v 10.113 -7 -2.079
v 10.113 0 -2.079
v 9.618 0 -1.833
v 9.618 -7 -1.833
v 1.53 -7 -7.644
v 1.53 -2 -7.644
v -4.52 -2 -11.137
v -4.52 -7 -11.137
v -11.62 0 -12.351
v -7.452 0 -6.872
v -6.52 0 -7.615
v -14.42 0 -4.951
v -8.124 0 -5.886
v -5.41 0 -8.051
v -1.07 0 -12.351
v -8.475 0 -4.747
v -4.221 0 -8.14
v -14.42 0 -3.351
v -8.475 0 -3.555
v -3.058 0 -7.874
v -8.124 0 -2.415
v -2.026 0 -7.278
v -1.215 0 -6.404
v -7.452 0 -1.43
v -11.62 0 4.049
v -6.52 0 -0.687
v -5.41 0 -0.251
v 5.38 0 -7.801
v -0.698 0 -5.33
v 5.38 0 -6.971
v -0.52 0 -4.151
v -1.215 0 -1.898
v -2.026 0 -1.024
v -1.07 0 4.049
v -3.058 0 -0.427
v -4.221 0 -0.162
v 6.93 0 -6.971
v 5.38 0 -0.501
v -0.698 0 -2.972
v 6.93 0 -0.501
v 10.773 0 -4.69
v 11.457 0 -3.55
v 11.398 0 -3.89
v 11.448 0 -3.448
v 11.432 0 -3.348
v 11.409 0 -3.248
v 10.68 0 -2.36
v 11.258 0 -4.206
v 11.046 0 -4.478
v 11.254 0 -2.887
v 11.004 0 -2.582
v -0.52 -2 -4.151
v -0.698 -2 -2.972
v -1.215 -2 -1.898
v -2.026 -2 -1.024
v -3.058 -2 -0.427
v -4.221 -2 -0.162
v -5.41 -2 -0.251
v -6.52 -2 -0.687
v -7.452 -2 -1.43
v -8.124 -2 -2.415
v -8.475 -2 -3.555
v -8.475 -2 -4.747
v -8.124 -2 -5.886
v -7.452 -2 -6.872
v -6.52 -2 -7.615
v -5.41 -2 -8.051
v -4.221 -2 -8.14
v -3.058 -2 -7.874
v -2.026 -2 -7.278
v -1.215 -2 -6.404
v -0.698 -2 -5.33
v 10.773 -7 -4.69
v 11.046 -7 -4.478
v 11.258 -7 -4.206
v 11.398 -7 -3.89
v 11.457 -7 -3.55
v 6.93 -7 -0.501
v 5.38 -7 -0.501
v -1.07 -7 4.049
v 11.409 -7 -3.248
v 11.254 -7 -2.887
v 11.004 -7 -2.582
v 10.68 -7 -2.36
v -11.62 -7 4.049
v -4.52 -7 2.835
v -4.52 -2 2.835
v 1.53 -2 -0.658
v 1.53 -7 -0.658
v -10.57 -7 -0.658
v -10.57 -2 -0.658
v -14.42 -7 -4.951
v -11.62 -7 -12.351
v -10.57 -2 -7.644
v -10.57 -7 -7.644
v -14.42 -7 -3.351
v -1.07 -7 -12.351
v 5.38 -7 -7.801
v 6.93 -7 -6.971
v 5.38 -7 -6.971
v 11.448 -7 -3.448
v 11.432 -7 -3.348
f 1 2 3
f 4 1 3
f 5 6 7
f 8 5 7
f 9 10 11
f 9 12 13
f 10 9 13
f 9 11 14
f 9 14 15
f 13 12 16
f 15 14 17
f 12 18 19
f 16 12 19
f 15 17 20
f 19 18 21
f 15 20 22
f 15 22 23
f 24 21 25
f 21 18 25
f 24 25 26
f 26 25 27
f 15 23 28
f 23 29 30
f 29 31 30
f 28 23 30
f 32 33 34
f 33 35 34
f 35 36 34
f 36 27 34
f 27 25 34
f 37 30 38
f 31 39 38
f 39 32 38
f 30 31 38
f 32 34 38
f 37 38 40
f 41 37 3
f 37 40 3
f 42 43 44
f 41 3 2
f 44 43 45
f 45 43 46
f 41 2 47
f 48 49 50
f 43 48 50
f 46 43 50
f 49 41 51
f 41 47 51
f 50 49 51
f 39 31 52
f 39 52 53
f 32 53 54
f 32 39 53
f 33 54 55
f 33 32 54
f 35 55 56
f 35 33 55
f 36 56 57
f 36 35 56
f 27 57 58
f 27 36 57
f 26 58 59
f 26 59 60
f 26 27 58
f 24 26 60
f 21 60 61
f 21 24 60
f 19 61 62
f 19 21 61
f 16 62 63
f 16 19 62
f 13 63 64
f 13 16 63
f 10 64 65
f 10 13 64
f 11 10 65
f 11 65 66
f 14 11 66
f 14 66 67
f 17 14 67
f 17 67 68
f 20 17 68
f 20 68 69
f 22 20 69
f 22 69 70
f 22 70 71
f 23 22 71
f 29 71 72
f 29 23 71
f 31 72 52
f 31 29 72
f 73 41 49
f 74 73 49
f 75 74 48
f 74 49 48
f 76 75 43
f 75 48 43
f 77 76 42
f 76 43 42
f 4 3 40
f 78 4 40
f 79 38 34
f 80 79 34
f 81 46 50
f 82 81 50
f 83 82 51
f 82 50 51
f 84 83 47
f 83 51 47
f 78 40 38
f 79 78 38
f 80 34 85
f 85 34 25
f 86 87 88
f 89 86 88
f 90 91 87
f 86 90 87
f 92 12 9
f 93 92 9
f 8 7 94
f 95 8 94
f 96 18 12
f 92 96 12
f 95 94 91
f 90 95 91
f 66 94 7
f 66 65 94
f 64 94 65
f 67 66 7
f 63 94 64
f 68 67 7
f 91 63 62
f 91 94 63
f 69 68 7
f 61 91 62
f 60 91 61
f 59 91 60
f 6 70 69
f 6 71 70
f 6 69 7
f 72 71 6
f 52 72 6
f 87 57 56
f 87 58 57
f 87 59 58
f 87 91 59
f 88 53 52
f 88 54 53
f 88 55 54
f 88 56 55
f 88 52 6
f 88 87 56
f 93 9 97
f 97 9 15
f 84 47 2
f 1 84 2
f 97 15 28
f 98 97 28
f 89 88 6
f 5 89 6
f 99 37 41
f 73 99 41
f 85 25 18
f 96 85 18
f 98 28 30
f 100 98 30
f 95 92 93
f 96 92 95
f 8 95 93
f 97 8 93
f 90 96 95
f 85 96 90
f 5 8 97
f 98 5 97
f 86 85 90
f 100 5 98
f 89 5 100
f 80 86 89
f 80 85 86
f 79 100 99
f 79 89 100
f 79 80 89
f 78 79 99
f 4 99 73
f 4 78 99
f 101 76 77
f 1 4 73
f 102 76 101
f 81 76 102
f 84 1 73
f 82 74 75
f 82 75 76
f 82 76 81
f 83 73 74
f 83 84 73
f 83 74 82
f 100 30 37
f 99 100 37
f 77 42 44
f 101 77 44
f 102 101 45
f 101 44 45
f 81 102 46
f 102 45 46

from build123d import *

# Parameters (mm, degrees)
F1_DEPTH = 7
F0_R     = 4
F2_DEPTH = 2


with BuildPart() as f1:
    # F0 (on Front) → F1 (new body)
    with BuildSketch(Plane.XZ):
        Polygon((-1.0698140982, 4.0490861801), (-11.6198140982, 4.0490861801), (-14.4198140982, -3.3509138199), (-14.4198140982, -4.9509138199), (-11.6198140982, -12.3509138199), (-1.0698140982, -12.3509138199), (5.3801859018, -7.8009138199), (5.3801859018, -6.9708852422), (5.3801859018, -0.5009138199), align=None)
        Polygon((1.5301859018, -0.6579446913), (1.5301859018, -7.6438829485), (-4.5198140982, -11.1368520771), (-10.5698140982, -7.6438829485), (-10.5698140982, -0.6579446913), (-4.5198140982, 2.8350244373), align=None, mode=Mode.SUBTRACT)
        with BuildLine():
            Line((6.9301859018, -0.5009138199), (5.3801859018, -0.5009138199))
            Line((5.3801859018, -0.5009138199), (5.3801859018, -6.9708852422))
            Line((5.3801859018, -6.9708852422), (6.9301859018, -6.9708852422))
            Line((6.9301859018, -6.9708852422), (10.7727036603, -4.6895619497))
            ThreePointArc((10.7727036603, -4.6895619497), (11.2584820634, -4.2060310818), (11.4565202284, -3.5498575968))
            ThreePointArc((11.4565202284, -3.5498575968), (11.4412037001, -3.3978310982), (11.4094109325, -3.248379192))
            Line((11.4094109325, -3.248379192), (10.6692053247, -3.248379192))
            ThreePointArc((10.6692053247, -3.248379192), (8.1008458295, -4.0583049575), (9.6180241196, -1.8333060186))
            Line((9.6180241196, -1.8333060186), (6.9301859018, -0.5009138199))
        make_face()
        with BuildLine():
            Line((10.679781054, -2.3596310954), (10.1132564961, -2.0787983815))
            ThreePointArc((10.1132564961, -2.0787983815), (10.5230870147, -2.5788610544), (10.6697620079, -3.2085515952))
            ThreePointArc((10.6697620079, -3.2085515952), (10.6696228303, -3.2284673388), (10.6692053247, -3.248379192))
            Line((10.6692053247, -3.248379192), (11.4094109325, -3.248379192))
            ThreePointArc((11.4094109325, -3.248379192), (11.140052623, -2.7256387208), (10.679781054, -2.3596310954))
        make_face()
        with BuildLine():
            Line((10.1132564961, -2.0787983815), (9.6180241196, -1.8333060186))
            ThreePointArc((9.6180241196, -1.8333060186), (8.1008458295, -4.0583049575), (10.6692053247, -3.248379192))
            ThreePointArc((10.6692053247, -3.248379192), (10.6696228303, -3.2284673388), (10.6697620079, -3.2085515952))
            ThreePointArc((10.6697620079, -3.2085515952), (10.5230870147, -2.5788610544), (10.1132564961, -2.0787983815))
        make_face()
    extrude(amount=F1_DEPTH)

    # F0 (on Front) → F2 (join)
    with BuildSketch(Plane.XZ):
        Polygon((-4.5198140982, -11.1368520771), (1.5301859018, -7.6438829485), (1.5301859018, -0.6579446913), (-4.5198140982, 2.8350244373), (-10.5698140982, -0.6579446913), (-10.5698140982, -7.6438829485), align=None)
        with Locations((-4.5198140982, -4.1509138199)):
            Circle(F0_R, mode=Mode.SUBTRACT)
    extrude(amount=F2_DEPTH)


solid = f1.part
